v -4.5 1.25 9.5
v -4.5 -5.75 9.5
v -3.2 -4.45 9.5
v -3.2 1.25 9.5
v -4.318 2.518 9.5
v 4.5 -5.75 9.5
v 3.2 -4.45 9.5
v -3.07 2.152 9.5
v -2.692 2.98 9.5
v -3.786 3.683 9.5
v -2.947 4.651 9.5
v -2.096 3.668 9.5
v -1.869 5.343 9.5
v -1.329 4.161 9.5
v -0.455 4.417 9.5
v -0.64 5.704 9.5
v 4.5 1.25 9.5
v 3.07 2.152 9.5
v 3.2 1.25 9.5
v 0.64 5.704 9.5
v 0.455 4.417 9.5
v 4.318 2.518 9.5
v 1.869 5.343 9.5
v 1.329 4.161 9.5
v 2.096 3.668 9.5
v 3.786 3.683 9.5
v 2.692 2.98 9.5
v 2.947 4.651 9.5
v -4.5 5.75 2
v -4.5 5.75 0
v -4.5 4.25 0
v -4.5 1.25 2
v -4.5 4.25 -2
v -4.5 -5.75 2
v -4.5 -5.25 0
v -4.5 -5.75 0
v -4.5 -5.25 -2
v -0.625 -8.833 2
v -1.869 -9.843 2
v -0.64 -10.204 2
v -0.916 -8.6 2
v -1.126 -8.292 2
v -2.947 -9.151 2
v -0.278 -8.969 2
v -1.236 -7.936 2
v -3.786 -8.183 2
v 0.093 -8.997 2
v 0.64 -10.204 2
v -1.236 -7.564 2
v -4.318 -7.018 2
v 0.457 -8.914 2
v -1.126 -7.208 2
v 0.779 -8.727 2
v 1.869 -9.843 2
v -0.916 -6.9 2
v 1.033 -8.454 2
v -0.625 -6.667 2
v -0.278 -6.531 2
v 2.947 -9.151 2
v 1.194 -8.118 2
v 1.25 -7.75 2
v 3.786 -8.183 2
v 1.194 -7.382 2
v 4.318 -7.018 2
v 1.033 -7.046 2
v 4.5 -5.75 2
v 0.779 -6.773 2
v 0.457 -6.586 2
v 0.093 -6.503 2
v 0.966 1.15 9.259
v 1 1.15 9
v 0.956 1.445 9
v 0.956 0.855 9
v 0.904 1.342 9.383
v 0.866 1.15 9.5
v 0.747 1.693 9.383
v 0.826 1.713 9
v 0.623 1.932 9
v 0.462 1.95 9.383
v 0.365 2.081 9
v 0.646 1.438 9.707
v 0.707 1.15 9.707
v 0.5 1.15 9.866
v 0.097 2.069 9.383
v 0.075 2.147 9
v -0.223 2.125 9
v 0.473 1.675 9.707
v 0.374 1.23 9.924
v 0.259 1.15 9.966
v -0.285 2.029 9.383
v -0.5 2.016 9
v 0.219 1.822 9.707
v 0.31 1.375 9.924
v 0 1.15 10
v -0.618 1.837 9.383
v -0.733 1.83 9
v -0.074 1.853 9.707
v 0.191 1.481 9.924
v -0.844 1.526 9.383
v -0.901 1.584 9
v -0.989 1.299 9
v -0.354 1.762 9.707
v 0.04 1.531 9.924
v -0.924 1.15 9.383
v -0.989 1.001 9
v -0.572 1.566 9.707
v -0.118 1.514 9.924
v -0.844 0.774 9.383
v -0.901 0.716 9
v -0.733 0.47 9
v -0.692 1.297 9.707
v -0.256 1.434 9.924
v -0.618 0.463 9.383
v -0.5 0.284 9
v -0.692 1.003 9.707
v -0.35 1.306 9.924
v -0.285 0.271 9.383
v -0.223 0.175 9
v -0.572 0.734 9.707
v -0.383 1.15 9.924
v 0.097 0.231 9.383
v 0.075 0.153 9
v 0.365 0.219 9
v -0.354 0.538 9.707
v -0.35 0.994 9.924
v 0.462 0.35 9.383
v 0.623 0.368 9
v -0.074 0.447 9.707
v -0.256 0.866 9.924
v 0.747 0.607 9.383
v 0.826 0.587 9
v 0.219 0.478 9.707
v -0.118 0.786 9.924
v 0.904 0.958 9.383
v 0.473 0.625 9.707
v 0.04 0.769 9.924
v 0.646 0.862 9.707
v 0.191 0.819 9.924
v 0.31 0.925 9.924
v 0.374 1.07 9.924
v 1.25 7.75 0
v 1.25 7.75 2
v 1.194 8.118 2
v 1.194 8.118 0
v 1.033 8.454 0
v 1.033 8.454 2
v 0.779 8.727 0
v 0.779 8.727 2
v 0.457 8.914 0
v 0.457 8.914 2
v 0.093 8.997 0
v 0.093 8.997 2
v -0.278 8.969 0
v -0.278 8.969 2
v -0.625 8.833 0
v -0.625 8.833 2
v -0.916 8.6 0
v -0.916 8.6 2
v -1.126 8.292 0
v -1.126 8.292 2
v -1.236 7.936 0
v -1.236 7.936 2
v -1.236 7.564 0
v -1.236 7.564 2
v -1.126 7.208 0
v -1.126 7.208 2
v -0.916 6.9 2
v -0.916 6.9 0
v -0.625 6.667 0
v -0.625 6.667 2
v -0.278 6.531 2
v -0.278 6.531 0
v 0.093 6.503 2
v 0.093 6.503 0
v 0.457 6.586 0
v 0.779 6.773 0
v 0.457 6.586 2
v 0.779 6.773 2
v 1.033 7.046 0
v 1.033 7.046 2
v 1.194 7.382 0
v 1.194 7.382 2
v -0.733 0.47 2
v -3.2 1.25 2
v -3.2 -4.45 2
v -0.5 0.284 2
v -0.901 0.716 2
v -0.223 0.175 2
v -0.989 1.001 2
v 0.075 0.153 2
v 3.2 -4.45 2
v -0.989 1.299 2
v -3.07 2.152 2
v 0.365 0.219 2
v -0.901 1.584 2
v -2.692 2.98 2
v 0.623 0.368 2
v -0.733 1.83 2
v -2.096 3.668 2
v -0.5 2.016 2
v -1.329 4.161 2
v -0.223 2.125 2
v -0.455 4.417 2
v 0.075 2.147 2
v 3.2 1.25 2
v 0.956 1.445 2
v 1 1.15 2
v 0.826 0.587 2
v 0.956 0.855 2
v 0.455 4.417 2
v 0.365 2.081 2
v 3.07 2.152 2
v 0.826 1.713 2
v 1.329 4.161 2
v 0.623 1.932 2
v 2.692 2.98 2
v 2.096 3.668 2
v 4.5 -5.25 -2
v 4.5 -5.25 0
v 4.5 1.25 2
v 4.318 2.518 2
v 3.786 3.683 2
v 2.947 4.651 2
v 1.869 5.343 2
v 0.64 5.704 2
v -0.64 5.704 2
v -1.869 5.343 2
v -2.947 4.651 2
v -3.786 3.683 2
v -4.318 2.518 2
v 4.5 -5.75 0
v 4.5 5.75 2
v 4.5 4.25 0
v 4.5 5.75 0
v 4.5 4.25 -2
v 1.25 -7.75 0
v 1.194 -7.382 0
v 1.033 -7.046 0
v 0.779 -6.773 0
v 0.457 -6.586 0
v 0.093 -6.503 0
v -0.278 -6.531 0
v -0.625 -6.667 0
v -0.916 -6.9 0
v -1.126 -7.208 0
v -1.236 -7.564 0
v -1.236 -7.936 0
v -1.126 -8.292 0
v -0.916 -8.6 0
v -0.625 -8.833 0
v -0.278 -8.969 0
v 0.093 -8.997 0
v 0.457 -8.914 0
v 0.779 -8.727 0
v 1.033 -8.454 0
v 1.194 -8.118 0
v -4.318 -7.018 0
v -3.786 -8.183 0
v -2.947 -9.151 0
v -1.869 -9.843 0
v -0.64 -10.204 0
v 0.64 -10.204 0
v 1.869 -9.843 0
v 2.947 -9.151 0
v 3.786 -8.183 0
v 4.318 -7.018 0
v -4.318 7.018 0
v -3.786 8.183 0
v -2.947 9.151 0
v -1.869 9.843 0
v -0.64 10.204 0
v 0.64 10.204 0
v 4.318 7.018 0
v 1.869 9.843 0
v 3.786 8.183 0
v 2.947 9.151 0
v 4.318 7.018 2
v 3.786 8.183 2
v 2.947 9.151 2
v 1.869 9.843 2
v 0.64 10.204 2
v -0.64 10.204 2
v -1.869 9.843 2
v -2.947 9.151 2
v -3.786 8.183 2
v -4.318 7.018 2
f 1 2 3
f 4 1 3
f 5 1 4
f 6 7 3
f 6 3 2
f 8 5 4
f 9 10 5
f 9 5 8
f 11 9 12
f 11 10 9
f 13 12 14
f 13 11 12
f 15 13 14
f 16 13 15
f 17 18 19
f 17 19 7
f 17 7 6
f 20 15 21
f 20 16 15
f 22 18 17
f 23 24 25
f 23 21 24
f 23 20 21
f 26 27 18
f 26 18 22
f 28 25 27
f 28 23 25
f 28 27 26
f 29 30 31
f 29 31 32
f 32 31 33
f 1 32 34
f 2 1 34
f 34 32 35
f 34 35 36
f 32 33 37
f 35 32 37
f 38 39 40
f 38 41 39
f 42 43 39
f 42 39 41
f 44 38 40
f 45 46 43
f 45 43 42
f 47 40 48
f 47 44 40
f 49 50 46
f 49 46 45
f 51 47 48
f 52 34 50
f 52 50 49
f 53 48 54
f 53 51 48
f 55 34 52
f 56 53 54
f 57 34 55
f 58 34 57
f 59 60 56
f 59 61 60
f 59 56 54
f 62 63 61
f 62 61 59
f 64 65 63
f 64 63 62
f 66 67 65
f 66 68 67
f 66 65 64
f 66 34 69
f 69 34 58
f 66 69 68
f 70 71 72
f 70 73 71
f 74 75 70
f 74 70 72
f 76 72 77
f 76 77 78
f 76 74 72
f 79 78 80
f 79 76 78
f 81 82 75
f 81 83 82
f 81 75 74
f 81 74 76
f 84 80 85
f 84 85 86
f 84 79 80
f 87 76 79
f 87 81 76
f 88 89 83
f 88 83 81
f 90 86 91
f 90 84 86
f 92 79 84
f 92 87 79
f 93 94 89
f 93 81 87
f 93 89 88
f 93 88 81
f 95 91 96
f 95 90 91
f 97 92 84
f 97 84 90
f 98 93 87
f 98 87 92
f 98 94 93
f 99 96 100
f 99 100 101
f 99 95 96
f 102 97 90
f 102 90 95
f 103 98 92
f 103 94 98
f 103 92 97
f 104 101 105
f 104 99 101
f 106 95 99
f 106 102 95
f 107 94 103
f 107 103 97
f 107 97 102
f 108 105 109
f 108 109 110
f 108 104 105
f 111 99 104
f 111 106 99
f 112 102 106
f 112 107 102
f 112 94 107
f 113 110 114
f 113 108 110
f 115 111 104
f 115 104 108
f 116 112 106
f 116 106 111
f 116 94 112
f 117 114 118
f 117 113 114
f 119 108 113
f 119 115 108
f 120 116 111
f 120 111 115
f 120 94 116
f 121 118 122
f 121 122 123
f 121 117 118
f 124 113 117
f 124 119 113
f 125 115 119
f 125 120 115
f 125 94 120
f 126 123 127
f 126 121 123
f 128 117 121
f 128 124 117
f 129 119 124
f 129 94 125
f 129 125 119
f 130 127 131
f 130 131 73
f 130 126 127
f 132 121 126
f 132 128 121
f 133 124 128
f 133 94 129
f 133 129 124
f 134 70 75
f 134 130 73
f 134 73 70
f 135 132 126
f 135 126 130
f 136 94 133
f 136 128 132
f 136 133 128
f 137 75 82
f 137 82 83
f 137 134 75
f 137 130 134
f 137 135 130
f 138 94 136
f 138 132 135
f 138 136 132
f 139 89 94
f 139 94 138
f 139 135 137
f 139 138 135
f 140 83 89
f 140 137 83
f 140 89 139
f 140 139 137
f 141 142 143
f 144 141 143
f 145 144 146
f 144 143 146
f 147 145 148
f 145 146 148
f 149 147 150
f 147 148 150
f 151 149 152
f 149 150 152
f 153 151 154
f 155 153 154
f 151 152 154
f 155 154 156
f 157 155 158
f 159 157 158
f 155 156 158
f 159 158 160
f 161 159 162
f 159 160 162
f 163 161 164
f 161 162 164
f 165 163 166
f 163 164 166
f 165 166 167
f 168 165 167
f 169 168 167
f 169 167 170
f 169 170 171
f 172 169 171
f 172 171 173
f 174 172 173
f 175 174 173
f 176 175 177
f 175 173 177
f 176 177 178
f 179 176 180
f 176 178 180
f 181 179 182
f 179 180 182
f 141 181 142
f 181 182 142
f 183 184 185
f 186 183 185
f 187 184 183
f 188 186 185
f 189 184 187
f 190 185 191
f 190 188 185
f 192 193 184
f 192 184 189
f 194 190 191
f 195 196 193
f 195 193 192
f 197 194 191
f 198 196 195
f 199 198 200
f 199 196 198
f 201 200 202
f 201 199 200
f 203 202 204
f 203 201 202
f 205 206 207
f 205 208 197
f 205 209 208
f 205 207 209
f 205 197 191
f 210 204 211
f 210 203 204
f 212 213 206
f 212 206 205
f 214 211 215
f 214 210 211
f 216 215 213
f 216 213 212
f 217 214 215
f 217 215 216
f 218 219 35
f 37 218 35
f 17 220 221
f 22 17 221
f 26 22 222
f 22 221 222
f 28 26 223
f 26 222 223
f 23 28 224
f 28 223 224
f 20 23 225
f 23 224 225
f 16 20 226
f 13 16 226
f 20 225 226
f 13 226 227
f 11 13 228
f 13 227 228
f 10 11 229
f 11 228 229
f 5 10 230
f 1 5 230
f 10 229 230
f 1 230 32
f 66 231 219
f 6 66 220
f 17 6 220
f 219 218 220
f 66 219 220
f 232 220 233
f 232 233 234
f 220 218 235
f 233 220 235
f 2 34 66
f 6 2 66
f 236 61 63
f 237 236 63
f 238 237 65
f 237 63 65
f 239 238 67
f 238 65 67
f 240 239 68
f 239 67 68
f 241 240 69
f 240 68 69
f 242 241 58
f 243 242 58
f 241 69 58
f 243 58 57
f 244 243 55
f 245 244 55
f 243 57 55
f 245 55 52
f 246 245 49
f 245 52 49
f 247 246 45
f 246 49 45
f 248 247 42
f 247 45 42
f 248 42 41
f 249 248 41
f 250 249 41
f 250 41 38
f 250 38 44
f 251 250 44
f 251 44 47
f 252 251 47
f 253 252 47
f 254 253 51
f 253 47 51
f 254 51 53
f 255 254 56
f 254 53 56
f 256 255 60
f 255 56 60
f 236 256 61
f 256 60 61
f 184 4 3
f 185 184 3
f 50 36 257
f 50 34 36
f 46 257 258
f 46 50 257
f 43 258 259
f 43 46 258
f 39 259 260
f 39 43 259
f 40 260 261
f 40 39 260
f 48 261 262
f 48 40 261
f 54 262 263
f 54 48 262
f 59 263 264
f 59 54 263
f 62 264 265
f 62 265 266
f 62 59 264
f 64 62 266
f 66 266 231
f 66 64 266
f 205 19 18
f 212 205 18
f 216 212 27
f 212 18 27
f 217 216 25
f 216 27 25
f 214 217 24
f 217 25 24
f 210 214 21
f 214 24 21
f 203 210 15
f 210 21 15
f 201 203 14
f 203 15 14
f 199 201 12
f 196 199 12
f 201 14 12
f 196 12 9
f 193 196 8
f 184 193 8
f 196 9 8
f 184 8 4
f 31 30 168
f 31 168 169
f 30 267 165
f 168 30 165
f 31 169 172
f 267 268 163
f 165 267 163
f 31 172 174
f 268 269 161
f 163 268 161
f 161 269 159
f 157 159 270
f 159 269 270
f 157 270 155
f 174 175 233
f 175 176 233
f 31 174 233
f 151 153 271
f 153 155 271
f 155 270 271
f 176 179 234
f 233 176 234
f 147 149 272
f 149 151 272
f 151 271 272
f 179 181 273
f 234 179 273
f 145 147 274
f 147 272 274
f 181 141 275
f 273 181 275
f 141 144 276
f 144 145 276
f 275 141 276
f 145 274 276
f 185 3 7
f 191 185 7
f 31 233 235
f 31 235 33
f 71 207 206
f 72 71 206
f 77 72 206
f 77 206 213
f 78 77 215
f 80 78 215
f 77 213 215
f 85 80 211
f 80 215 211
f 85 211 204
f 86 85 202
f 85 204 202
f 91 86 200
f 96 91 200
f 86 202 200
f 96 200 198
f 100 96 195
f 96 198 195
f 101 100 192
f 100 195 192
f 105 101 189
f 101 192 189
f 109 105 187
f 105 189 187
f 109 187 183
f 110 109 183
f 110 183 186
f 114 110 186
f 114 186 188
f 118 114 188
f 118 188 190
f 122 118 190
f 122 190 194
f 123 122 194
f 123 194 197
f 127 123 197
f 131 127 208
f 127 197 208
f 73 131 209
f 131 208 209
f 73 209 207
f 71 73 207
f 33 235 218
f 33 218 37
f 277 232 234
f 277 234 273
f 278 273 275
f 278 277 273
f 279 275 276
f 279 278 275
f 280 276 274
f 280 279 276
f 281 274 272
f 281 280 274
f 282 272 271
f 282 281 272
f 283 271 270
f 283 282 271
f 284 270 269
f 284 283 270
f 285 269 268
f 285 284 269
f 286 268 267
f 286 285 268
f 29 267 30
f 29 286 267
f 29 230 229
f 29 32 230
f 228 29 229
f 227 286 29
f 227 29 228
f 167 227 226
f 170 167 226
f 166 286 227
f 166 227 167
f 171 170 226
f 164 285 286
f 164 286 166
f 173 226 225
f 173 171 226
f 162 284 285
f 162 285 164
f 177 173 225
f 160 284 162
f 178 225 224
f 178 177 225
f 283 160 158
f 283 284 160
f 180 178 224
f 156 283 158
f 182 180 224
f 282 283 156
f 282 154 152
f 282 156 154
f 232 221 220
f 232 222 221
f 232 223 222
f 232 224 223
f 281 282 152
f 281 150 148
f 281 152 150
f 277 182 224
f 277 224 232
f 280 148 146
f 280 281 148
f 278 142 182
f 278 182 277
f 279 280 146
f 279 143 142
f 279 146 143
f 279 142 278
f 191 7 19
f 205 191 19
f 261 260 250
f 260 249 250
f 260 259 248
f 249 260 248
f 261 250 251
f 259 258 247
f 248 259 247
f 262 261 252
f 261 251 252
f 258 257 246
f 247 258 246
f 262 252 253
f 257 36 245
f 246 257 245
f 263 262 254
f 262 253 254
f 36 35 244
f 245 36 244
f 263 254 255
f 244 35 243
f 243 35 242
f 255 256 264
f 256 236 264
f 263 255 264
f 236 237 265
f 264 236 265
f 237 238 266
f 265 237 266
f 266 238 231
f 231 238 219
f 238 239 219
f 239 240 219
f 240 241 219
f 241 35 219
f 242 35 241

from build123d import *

# Parameters (mm, degrees)
SCHIZZO1_W                   = 9
SCHIZZO1_H                   = 11.5
ESTRUSIONE_ESTRUSIONE1_DEPTH = 2
SCHIZZO2_R                   = 4.5
ESTRUSIONE_ESTRUSIONE2_DEPTH = 2
SCHIZZO3_R                   = 1.25
TAGLIO_ESTRUSIONE1_DEPTH     = 2
ESTRUSIONE_ESTRUSIONE4_DEPTH = 7.5
TAGLIO_ESTRUSIONE2_DEPTH     = 7.5
SCHIZZO7_R                   = 1
ESTRUSIONE_ESTRUSIONE5_DEPTH = 8
RACCORDO1_R                  = 1
SCHIZZO8_W                   = 9
SCHIZZO8_H                   = 9.5
ESTRUSIONE_ESTRUSIONE6_DEPTH = 2


with BuildPart() as part:
    # Schizzo1 → Estrusione-Estrusione1 (new body)
    with BuildSketch(Plane.XY):
        Rectangle(SCHIZZO1_W, SCHIZZO1_H)
    extrude(amount=ESTRUSIONE_ESTRUSIONE1_DEPTH)

    # Schizzo2 → Estrusione-Estrusione2 (add)
    with BuildSketch(Plane.XY.offset(2)):
        with Locations((0, 5.75)):
            Circle(SCHIZZO2_R)
        with Locations((0, -5.75)):
            Circle(SCHIZZO2_R)
    extrude(amount=-ESTRUSIONE_ESTRUSIONE2_DEPTH)

    # Schizzo3 → Taglio-Estrusione1 (cut)
    with BuildSketch(Plane.XY.offset(2)):
        with Locations((0, -7.75)):
            Circle(SCHIZZO3_R)
        with Locations((0, 7.75)):
            Circle(SCHIZZO3_R)
    extrude(amount=-TAGLIO_ESTRUSIONE1_DEPTH, mode=Mode.SUBTRACT)

    # Schizzo4 → Estrusione-Estrusione4 (add)
    with BuildSketch(Plane.XY.offset(2)):
        with BuildLine():
            ThreePointArc((4.5, 1.25), (0, 5.75), (-4.5, 1.25))
            Line((-4.5, 1.25), (4.5, 1.25))
        make_face()
        with BuildLine():
            Line((4.5, 1.25), (-4.5, 1.25))
            ThreePointArc((-4.5, 1.25), (0, -3.25), (4.5, 1.25))
        make_face()
        with BuildLine():
            ThreePointArc((4.5, 1.25), (0, 5.75), (-4.5, 1.25))
            Line((-4.5, 1.25), (4.5, 1.25))
        make_face()
        with BuildLine():
            Line((4.5, 1.25), (-4.5, 1.25))
            ThreePointArc((-4.5, 1.25), (0, -3.25), (4.5, 1.25))
        make_face()
        with BuildLine():
            Line((-4.5, 1.25), (-4.5, -5.75))
            Line((-4.5, -5.75), (4.5, -5.75))
            Line((4.5, -5.75), (4.5, 1.25))
            ThreePointArc((4.5, 1.25), (0, -3.25), (-4.5, 1.25))
        make_face()
    extrude(amount=ESTRUSIONE_ESTRUSIONE4_DEPTH)

    # Schizzo6 → Taglio-Estrusione2 (cut)
    with BuildSketch(Plane.XY.offset(9.5)):
        with BuildLine():
            ThreePointArc((3.2, 1.25), (0, 4.45), (-3.2, 1.25))
            Line((-3.2, 1.25), (3.2, 1.25))
        make_face()
        with BuildLine():
            Line((3.2, 1.25), (-3.2, 1.25))
            ThreePointArc((-3.2, 1.25), (0, -1.95), (3.2, 1.25))
        make_face()
        with BuildLine():
            ThreePointArc((3.2, 1.25), (0, 4.45), (-3.2, 1.25))
            Line((-3.2, 1.25), (3.2, 1.25))
        make_face()
        with BuildLine():
            Line((3.2, 1.25), (-3.2, 1.25))
            ThreePointArc((-3.2, 1.25), (0, -1.95), (3.2, 1.25))
        make_face()
        with BuildLine():
            ThreePointArc((3.2, 1.25), (0, -1.95), (-3.2, 1.25))
            Line((-3.2, 1.25), (-3.2, -4.45))
            Line((-3.2, -4.45), (3.2, -4.45))
            Line((3.2, -4.45), (3.2, 1.25))
        make_face()
    extrude(amount=-TAGLIO_ESTRUSIONE2_DEPTH, mode=Mode.SUBTRACT)

    # Schizzo7 → Estrusione-Estrusione5 (add)
    with BuildSketch(Plane.XY.offset(2)):
        with Locations((0, 1.15)):
            Circle(SCHIZZO7_R)
    extrude(amount=ESTRUSIONE_ESTRUSIONE5_DEPTH)

    # Raccordo1
    raccordo1_edges = [part.edges().sort_by_distance(p)[0] for p in [
        (-1, 1.15, 10),
    ]]
    fillet(raccordo1_edges, radius=RACCORDO1_R)

    # Schizzo8 → Estrusione-Estrusione6 (add)
    with BuildSketch(Plane(origin=(0, 0, 0), x_dir=(-1, 0, 0), z_dir=(0, 0, -1))):
        with Locations((0, -0.5)):
            Rectangle(SCHIZZO8_W, SCHIZZO8_H)
    extrude(amount=ESTRUSIONE_ESTRUSIONE6_DEPTH)


solid = part.part
